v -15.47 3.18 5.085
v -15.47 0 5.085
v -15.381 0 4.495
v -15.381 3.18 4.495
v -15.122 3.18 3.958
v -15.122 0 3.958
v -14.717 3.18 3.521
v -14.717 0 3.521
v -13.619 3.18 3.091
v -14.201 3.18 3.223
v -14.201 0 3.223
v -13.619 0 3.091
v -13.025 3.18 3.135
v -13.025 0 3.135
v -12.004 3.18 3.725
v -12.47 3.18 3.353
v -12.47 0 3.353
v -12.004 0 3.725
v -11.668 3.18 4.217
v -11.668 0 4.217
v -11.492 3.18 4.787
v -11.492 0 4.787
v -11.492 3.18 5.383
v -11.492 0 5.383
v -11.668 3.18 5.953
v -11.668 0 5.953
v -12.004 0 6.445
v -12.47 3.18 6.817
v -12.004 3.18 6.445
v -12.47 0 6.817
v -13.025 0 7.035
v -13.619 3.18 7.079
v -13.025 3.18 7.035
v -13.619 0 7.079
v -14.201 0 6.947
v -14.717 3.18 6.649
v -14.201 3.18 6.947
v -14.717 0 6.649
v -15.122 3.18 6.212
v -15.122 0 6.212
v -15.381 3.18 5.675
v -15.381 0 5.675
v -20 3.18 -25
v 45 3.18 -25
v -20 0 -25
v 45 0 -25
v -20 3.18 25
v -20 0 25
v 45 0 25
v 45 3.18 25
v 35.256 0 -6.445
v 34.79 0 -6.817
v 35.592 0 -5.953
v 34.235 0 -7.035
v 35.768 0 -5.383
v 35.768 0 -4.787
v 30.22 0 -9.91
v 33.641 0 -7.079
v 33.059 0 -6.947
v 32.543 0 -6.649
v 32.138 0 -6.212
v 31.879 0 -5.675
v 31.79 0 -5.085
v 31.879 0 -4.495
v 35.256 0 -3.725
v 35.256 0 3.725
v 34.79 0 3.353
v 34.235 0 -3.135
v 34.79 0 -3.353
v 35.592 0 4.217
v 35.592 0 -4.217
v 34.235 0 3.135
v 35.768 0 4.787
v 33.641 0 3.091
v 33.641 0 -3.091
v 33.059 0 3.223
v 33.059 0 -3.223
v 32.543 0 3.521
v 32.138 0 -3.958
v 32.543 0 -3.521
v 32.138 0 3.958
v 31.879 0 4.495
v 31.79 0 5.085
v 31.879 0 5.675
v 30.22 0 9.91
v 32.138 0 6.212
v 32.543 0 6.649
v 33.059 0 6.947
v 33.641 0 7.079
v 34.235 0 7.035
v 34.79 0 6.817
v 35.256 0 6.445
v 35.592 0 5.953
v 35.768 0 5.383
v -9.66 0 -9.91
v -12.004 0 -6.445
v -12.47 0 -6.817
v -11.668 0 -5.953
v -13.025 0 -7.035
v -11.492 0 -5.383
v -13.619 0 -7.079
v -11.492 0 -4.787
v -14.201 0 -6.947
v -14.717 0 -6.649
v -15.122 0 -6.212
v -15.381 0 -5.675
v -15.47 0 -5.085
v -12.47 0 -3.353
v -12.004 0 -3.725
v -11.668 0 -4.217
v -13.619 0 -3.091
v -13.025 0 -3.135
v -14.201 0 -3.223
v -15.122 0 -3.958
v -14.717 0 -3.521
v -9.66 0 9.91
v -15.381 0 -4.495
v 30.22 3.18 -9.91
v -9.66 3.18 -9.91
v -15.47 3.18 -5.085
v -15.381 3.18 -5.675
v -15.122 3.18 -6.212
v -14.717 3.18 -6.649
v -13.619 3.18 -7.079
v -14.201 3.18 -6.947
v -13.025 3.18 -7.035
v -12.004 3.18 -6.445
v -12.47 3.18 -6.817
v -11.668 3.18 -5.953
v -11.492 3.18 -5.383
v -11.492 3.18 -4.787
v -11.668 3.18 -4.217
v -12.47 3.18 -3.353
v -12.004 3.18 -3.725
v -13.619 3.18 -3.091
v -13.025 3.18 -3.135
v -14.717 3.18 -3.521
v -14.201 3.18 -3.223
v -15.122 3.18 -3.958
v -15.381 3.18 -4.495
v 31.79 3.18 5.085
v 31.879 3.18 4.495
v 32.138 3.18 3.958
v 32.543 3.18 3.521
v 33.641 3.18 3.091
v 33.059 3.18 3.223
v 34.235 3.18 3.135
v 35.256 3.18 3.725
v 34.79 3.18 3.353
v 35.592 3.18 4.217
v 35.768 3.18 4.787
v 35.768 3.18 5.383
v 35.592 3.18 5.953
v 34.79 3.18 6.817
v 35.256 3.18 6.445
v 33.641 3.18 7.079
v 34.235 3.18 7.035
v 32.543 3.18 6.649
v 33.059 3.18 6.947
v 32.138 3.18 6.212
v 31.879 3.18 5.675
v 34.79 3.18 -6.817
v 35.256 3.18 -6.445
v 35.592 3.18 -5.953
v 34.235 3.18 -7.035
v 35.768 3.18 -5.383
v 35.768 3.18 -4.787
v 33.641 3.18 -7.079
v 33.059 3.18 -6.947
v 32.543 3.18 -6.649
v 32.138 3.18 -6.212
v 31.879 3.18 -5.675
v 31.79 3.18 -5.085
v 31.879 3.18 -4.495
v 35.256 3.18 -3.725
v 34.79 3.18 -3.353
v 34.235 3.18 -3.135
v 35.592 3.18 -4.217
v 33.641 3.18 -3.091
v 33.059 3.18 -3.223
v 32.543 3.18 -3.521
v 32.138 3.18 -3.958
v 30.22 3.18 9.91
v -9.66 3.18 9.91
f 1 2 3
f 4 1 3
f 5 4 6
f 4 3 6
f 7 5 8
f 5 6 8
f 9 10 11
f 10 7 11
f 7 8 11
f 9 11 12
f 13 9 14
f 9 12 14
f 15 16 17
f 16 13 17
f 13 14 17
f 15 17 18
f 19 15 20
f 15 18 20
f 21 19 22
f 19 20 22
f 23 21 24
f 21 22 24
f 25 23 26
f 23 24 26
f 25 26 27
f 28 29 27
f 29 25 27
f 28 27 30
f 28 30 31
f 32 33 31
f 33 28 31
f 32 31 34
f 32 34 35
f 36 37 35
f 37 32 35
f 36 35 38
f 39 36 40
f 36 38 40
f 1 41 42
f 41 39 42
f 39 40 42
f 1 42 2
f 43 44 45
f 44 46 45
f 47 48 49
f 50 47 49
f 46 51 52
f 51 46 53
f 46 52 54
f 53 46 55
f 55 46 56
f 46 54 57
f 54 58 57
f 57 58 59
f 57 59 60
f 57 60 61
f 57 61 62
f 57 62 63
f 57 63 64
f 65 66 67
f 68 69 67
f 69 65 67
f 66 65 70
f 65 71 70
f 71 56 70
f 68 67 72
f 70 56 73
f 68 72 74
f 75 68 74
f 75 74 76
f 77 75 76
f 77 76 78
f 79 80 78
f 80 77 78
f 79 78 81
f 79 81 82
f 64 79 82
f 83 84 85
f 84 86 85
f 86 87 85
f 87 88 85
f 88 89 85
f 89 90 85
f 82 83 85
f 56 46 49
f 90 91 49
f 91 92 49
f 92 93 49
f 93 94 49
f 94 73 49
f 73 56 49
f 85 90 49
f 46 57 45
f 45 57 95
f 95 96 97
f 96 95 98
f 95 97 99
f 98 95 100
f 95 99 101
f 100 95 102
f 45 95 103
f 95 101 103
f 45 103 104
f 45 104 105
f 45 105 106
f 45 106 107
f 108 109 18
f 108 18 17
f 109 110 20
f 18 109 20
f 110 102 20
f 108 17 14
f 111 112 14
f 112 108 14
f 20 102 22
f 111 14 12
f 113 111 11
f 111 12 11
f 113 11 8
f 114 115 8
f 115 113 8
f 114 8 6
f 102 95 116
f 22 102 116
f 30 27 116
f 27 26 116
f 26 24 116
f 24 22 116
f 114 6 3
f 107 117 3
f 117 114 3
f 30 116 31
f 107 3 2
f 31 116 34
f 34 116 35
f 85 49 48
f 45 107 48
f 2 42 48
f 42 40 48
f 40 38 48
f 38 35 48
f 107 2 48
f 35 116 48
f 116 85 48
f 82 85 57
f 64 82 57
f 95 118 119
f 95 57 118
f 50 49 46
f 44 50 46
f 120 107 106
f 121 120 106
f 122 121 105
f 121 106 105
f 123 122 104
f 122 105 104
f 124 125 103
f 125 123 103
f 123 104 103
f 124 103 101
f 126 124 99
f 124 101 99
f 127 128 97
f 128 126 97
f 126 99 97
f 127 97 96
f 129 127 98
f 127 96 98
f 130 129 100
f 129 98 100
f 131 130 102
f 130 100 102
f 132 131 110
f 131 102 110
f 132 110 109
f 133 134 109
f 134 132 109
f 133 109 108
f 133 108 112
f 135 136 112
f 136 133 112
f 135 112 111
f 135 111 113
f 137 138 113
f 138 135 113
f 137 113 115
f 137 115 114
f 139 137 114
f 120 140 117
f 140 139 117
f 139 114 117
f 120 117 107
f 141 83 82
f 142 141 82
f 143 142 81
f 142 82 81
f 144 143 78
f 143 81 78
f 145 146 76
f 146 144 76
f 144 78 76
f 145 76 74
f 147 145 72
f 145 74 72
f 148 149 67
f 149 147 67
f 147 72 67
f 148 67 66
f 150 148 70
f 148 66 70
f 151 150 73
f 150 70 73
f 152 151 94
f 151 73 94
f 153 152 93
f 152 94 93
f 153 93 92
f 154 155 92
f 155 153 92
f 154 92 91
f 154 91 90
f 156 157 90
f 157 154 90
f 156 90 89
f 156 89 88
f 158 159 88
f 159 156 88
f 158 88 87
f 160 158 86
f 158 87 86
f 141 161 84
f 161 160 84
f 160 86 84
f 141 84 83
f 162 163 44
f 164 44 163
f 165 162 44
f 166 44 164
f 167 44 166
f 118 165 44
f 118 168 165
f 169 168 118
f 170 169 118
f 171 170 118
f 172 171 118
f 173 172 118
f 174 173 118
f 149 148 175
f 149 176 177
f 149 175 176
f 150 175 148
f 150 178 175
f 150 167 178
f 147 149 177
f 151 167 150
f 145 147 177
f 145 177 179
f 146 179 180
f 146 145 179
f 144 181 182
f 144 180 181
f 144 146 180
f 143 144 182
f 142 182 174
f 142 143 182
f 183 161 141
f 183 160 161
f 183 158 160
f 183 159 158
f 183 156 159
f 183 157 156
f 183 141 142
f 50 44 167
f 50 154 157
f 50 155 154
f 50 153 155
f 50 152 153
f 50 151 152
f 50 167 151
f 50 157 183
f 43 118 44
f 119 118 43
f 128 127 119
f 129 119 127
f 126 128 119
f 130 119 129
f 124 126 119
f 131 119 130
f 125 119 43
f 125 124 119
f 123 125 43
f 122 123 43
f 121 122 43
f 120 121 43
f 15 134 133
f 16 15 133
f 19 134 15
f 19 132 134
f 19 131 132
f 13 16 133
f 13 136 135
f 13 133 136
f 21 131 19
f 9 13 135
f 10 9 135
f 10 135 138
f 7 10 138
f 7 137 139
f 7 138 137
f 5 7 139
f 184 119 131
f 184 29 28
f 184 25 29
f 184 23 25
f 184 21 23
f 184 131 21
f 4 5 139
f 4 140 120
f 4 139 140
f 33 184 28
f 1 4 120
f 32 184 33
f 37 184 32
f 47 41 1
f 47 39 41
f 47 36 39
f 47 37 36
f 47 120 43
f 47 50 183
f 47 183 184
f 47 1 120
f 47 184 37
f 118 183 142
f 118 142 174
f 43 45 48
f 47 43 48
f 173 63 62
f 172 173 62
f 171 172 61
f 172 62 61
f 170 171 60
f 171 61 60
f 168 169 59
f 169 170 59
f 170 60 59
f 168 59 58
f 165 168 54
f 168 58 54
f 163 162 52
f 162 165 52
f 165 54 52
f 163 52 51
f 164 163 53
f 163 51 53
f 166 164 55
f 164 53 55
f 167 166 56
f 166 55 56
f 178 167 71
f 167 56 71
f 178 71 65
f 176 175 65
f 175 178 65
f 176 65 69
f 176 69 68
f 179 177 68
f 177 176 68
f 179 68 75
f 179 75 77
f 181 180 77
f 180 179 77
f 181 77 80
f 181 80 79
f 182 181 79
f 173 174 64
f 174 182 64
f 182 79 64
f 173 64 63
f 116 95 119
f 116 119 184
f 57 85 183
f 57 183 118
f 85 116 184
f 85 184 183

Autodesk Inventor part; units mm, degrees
ref_plane "YZ Plane" through (0, 0, 0) normal (1, 0, 0) x (0, 1, 0)
ref_plane "XZ Plane" through (0, 0, 0) normal (0, 1, 0) x (-1, 0, 0)
ref_plane "XY Plane" through (0, 0, 0) normal (0, 0, 1) x (1, 0, 0)
sketch "Sketch1" plane through (0, 0, 0) normal (0, 1, 0) x (-1, 0, 0)
  circle A0 centre (-33.79, -5.085) radius 2
  circle A1 centre (-33.79, 5.085) radius 2
  circle A2 centre (13.47, -5.085) radius 2
  circle A3 centre (13.47, 5.085) radius 2
  line L0 (20, 25) -> (-45, 25)
  line L1 (-45, 25) -> (-45, -25)
  line L2 (-45, -25) -> (20, -25)
  line L3 (20, -25) -> (20, 25)
  line L4 (9.66, 9.91) -> (-30.22, 9.91)
  line L5 (-30.22, 9.91) -> (-30.22, -9.91)
  line L6 (-30.22, -9.91) -> (9.66, -9.91)
  line L7 (9.66, -9.91) -> (9.66, 9.91)
  point P0 (0, 0)
  point P1 (0, 0)
  dimension "d0" = 4
  dimension "d1" = 4
  dimension "d2" = 4
  dimension "d3" = 4
  dimension "d4" = 13.47
  dimension "d5" = 5.085
  dimension "d6" = 10.17
  dimension "d7" = 13.47
  dimension "d8" = 33.79
  dimension "d9" = 5.085
  dimension "d10" = 10.17
  dimension "d12" = 50
  dimension "d13" = 65
  dimension "d15" = 25
  dimension "d25" = 9.66
  dimension "d26" = 19.82
  dimension "d27" = 9.91
  dimension "d28" = 39.88
  dimension "d29" = 33.79
  dimension "d30" = 20
extrude "Extrusion1" add sketch "Sketch1" along normal blind 3.18
properties part number "Hombro_servo"
